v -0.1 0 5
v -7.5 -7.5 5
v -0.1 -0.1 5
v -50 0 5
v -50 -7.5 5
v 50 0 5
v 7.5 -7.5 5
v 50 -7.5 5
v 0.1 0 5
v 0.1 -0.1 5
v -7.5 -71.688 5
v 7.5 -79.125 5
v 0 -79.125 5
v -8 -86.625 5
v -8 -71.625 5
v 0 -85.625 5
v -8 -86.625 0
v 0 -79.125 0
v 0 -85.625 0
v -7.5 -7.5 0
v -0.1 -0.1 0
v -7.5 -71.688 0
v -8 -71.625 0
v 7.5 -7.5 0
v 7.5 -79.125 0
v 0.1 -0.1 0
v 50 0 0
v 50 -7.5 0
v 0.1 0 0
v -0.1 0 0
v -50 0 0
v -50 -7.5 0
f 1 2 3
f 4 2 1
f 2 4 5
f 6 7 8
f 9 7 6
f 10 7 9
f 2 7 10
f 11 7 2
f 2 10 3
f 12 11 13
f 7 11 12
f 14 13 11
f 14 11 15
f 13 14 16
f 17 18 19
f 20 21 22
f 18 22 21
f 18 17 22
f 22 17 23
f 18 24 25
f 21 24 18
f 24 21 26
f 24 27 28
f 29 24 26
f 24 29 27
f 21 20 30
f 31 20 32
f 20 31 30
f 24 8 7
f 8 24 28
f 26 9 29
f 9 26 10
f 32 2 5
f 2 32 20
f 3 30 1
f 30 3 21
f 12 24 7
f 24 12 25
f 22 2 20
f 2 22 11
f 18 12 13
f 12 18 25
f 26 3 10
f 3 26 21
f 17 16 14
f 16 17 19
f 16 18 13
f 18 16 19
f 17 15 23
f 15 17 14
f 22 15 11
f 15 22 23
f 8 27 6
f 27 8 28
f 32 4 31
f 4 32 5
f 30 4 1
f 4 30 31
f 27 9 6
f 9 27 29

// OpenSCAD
// file: ../src/model_a_cross_brace.scad
// ============================================
// PiCanvas - 모델 A: 십자 보강재
// ============================================

// --- 공통 파라미터 (center_bracket과 동일) ---
bracket_size = 70;
bracket_thickness = 5;

// LCD 디스플레이
lcd_w = 350.66;
lcd_h = 216.25;
lcd_d = 3.2;

// 프레임
frame_bezel = 3;        // 전면 오버랩
frame_wall = 6;         // 프레임 벽 두께
frame_inner_w = lcd_w;
frame_inner_h = lcd_h;
frame_outer_w = lcd_w + frame_wall * 2;
frame_outer_h = lcd_h + frame_wall * 2;

// 십자 보강재
cross_bar_width = 15;     // 바 너비
cross_bar_thickness = bracket_thickness;  // 브라켓과 동일 두께

// 도브테일 파라미터 (center_bracket과 맞춤)
dt_width = 15;
dt_depth = 8;
dt_taper = 1;  // 사다리꼴 기울기

// --- 모듈 ---

// 도브테일 암 (center_bracket 쪽 연결)
module dovetail_female(height) {
    clearance = 0.2;  // 끼워맞춤 여유
    linear_extrude(height = height)
        polygon([
            [-(dt_width/2 - dt_taper) - clearance, 0],
            [(dt_width/2 - dt_taper) + clearance, 0],
            [dt_width/2 + clearance, dt_depth + clearance],
            [-dt_width/2 - clearance, dt_depth + clearance]
        ]);
}

// 프레임 연결용 도브테일 수 (끝단)
module dovetail_male_end() {
    linear_extrude(height = cross_bar_thickness)
        polygon([
            [-dt_width/2 + dt_taper, 0],
            [dt_width/2 - dt_taper, 0],
            [dt_width/2, dt_depth],
            [-dt_width/2, dt_depth]
        ]);
}

// 수평 바 (좌우, X축 방향)
module horizontal_bar() {
    bar_length_half = frame_outer_w / 2 - bracket_size / 2;

    // 오른쪽 바
    module half_bar() {
        difference() {
            translate([0, -cross_bar_width/2, 0])
                cube([bar_length_half, cross_bar_width, cross_bar_thickness]);

            // 중앙 브라켓 도브테일 암 (빼기)
            translate([0, 0, 0])
                rotate([0, 0, -90])
                    translate([-dt_width/2 - 0.1, -dt_depth - 0.1, -0.5])
                        cube([dt_width + 0.2, dt_depth + 0.2, cross_bar_thickness + 1]);
        }

        // 프레임 연결 도브테일 (끝단)
        translate([bar_length_half, 0, 0])
            dovetail_male_end();
    }

    // 오른쪽
    half_bar();

    // 왼쪽 (미러)
    mirror([1, 0, 0])
        half_bar();
}

// 수직 바 (상하, Y축 방향)
module vertical_bar() {
    bar_length_half = frame_outer_h / 2 - bracket_size / 2;

    module half_bar() {
        difference() {
            translate([-cross_bar_width/2, 0, 0])
                cube([cross_bar_width, bar_length_half, cross_bar_thickness]);

            // 중앙 브라켓 도브테일 암 (빼기)
            translate([0, 0, 0])
                rotate([0, 0, 0])
                    translate([-dt_width/2 - 0.1, -dt_depth - 0.1, -0.5])
                        cube([dt_width + 0.2, dt_depth + 0.2, cross_bar_thickness + 1]);
        }

        // 프레임 연결 도브테일 (끝단)
        translate([0, bar_length_half, 0])
            rotate([0, 0, 90])
                dovetail_male_end();
    }

    // 위쪽
    half_bar();

    // 아래쪽 (미러)
    mirror([0, 1, 0])
        half_bar();
}

// --- 메인 ---

module model_a_cross_brace() {
    color("CadetBlue") {
        horizontal_bar();
        vertical_bar();
    }
}

model_a_cross_brace();

// 디버그: 중앙 브라켓 외형 (투명)
%translate([-bracket_size/2, -bracket_size/2, 0])
    cube([bracket_size, bracket_size, bracket_thickness]);

// 디버그: 프레임 외형 (투명)
%translate([-frame_outer_w/2, -frame_outer_h/2, 0])
    difference() {
        cube([frame_outer_w, frame_outer_h, 1]);
        translate([frame_wall, frame_wall, -0.5])
            cube([frame_inner_w, frame_inner_h, 2]);
    }
// main file
// ============================================
// Plate 5: 십자 보강재 - 수직 하단 반쪽
// 크기: 15 x ~79 mm (OK)
// ============================================
use <../src/model_a_cross_brace.scad>

lcd_h = 216.25;
frame_wall = 6;
frame_outer_h = lcd_h + frame_wall * 2;

intersection() {
    model_a_cross_brace();
    translate([-50, -frame_outer_h, -1])
        cube([100, frame_outer_h, 20]);
}
